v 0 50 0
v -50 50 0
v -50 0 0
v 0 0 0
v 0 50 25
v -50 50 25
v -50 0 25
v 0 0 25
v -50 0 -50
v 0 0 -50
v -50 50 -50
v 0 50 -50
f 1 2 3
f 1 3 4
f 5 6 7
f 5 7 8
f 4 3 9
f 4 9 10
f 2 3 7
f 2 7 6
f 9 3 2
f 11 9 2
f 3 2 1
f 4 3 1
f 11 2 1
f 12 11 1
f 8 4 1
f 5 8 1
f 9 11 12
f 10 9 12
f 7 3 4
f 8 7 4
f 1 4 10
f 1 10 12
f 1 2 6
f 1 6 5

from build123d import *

# Parameters (mm, degrees)
F0_W     = 50
F0_H     = 50
F1_DEPTH = 50
F2_W     = 50
F2_H     = 50
F3_DEPTH = 25


with BuildPart() as f1:
    # F0 (on Top) → F1 (new body)
    with BuildSketch(Plane.XY):
        with Locations((-25, 25)):
            Rectangle(F0_W, F0_H)
    extrude(amount=-F1_DEPTH)


with BuildPart() as f3:
    # F2 (on face) → F3 (new body)
    with BuildSketch(Plane.XY):
        with Locations((-25, 25)):
            Rectangle(F2_W, F2_H)
    extrude(amount=F3_DEPTH)


solid = Compound([f1.part, f3.part])
